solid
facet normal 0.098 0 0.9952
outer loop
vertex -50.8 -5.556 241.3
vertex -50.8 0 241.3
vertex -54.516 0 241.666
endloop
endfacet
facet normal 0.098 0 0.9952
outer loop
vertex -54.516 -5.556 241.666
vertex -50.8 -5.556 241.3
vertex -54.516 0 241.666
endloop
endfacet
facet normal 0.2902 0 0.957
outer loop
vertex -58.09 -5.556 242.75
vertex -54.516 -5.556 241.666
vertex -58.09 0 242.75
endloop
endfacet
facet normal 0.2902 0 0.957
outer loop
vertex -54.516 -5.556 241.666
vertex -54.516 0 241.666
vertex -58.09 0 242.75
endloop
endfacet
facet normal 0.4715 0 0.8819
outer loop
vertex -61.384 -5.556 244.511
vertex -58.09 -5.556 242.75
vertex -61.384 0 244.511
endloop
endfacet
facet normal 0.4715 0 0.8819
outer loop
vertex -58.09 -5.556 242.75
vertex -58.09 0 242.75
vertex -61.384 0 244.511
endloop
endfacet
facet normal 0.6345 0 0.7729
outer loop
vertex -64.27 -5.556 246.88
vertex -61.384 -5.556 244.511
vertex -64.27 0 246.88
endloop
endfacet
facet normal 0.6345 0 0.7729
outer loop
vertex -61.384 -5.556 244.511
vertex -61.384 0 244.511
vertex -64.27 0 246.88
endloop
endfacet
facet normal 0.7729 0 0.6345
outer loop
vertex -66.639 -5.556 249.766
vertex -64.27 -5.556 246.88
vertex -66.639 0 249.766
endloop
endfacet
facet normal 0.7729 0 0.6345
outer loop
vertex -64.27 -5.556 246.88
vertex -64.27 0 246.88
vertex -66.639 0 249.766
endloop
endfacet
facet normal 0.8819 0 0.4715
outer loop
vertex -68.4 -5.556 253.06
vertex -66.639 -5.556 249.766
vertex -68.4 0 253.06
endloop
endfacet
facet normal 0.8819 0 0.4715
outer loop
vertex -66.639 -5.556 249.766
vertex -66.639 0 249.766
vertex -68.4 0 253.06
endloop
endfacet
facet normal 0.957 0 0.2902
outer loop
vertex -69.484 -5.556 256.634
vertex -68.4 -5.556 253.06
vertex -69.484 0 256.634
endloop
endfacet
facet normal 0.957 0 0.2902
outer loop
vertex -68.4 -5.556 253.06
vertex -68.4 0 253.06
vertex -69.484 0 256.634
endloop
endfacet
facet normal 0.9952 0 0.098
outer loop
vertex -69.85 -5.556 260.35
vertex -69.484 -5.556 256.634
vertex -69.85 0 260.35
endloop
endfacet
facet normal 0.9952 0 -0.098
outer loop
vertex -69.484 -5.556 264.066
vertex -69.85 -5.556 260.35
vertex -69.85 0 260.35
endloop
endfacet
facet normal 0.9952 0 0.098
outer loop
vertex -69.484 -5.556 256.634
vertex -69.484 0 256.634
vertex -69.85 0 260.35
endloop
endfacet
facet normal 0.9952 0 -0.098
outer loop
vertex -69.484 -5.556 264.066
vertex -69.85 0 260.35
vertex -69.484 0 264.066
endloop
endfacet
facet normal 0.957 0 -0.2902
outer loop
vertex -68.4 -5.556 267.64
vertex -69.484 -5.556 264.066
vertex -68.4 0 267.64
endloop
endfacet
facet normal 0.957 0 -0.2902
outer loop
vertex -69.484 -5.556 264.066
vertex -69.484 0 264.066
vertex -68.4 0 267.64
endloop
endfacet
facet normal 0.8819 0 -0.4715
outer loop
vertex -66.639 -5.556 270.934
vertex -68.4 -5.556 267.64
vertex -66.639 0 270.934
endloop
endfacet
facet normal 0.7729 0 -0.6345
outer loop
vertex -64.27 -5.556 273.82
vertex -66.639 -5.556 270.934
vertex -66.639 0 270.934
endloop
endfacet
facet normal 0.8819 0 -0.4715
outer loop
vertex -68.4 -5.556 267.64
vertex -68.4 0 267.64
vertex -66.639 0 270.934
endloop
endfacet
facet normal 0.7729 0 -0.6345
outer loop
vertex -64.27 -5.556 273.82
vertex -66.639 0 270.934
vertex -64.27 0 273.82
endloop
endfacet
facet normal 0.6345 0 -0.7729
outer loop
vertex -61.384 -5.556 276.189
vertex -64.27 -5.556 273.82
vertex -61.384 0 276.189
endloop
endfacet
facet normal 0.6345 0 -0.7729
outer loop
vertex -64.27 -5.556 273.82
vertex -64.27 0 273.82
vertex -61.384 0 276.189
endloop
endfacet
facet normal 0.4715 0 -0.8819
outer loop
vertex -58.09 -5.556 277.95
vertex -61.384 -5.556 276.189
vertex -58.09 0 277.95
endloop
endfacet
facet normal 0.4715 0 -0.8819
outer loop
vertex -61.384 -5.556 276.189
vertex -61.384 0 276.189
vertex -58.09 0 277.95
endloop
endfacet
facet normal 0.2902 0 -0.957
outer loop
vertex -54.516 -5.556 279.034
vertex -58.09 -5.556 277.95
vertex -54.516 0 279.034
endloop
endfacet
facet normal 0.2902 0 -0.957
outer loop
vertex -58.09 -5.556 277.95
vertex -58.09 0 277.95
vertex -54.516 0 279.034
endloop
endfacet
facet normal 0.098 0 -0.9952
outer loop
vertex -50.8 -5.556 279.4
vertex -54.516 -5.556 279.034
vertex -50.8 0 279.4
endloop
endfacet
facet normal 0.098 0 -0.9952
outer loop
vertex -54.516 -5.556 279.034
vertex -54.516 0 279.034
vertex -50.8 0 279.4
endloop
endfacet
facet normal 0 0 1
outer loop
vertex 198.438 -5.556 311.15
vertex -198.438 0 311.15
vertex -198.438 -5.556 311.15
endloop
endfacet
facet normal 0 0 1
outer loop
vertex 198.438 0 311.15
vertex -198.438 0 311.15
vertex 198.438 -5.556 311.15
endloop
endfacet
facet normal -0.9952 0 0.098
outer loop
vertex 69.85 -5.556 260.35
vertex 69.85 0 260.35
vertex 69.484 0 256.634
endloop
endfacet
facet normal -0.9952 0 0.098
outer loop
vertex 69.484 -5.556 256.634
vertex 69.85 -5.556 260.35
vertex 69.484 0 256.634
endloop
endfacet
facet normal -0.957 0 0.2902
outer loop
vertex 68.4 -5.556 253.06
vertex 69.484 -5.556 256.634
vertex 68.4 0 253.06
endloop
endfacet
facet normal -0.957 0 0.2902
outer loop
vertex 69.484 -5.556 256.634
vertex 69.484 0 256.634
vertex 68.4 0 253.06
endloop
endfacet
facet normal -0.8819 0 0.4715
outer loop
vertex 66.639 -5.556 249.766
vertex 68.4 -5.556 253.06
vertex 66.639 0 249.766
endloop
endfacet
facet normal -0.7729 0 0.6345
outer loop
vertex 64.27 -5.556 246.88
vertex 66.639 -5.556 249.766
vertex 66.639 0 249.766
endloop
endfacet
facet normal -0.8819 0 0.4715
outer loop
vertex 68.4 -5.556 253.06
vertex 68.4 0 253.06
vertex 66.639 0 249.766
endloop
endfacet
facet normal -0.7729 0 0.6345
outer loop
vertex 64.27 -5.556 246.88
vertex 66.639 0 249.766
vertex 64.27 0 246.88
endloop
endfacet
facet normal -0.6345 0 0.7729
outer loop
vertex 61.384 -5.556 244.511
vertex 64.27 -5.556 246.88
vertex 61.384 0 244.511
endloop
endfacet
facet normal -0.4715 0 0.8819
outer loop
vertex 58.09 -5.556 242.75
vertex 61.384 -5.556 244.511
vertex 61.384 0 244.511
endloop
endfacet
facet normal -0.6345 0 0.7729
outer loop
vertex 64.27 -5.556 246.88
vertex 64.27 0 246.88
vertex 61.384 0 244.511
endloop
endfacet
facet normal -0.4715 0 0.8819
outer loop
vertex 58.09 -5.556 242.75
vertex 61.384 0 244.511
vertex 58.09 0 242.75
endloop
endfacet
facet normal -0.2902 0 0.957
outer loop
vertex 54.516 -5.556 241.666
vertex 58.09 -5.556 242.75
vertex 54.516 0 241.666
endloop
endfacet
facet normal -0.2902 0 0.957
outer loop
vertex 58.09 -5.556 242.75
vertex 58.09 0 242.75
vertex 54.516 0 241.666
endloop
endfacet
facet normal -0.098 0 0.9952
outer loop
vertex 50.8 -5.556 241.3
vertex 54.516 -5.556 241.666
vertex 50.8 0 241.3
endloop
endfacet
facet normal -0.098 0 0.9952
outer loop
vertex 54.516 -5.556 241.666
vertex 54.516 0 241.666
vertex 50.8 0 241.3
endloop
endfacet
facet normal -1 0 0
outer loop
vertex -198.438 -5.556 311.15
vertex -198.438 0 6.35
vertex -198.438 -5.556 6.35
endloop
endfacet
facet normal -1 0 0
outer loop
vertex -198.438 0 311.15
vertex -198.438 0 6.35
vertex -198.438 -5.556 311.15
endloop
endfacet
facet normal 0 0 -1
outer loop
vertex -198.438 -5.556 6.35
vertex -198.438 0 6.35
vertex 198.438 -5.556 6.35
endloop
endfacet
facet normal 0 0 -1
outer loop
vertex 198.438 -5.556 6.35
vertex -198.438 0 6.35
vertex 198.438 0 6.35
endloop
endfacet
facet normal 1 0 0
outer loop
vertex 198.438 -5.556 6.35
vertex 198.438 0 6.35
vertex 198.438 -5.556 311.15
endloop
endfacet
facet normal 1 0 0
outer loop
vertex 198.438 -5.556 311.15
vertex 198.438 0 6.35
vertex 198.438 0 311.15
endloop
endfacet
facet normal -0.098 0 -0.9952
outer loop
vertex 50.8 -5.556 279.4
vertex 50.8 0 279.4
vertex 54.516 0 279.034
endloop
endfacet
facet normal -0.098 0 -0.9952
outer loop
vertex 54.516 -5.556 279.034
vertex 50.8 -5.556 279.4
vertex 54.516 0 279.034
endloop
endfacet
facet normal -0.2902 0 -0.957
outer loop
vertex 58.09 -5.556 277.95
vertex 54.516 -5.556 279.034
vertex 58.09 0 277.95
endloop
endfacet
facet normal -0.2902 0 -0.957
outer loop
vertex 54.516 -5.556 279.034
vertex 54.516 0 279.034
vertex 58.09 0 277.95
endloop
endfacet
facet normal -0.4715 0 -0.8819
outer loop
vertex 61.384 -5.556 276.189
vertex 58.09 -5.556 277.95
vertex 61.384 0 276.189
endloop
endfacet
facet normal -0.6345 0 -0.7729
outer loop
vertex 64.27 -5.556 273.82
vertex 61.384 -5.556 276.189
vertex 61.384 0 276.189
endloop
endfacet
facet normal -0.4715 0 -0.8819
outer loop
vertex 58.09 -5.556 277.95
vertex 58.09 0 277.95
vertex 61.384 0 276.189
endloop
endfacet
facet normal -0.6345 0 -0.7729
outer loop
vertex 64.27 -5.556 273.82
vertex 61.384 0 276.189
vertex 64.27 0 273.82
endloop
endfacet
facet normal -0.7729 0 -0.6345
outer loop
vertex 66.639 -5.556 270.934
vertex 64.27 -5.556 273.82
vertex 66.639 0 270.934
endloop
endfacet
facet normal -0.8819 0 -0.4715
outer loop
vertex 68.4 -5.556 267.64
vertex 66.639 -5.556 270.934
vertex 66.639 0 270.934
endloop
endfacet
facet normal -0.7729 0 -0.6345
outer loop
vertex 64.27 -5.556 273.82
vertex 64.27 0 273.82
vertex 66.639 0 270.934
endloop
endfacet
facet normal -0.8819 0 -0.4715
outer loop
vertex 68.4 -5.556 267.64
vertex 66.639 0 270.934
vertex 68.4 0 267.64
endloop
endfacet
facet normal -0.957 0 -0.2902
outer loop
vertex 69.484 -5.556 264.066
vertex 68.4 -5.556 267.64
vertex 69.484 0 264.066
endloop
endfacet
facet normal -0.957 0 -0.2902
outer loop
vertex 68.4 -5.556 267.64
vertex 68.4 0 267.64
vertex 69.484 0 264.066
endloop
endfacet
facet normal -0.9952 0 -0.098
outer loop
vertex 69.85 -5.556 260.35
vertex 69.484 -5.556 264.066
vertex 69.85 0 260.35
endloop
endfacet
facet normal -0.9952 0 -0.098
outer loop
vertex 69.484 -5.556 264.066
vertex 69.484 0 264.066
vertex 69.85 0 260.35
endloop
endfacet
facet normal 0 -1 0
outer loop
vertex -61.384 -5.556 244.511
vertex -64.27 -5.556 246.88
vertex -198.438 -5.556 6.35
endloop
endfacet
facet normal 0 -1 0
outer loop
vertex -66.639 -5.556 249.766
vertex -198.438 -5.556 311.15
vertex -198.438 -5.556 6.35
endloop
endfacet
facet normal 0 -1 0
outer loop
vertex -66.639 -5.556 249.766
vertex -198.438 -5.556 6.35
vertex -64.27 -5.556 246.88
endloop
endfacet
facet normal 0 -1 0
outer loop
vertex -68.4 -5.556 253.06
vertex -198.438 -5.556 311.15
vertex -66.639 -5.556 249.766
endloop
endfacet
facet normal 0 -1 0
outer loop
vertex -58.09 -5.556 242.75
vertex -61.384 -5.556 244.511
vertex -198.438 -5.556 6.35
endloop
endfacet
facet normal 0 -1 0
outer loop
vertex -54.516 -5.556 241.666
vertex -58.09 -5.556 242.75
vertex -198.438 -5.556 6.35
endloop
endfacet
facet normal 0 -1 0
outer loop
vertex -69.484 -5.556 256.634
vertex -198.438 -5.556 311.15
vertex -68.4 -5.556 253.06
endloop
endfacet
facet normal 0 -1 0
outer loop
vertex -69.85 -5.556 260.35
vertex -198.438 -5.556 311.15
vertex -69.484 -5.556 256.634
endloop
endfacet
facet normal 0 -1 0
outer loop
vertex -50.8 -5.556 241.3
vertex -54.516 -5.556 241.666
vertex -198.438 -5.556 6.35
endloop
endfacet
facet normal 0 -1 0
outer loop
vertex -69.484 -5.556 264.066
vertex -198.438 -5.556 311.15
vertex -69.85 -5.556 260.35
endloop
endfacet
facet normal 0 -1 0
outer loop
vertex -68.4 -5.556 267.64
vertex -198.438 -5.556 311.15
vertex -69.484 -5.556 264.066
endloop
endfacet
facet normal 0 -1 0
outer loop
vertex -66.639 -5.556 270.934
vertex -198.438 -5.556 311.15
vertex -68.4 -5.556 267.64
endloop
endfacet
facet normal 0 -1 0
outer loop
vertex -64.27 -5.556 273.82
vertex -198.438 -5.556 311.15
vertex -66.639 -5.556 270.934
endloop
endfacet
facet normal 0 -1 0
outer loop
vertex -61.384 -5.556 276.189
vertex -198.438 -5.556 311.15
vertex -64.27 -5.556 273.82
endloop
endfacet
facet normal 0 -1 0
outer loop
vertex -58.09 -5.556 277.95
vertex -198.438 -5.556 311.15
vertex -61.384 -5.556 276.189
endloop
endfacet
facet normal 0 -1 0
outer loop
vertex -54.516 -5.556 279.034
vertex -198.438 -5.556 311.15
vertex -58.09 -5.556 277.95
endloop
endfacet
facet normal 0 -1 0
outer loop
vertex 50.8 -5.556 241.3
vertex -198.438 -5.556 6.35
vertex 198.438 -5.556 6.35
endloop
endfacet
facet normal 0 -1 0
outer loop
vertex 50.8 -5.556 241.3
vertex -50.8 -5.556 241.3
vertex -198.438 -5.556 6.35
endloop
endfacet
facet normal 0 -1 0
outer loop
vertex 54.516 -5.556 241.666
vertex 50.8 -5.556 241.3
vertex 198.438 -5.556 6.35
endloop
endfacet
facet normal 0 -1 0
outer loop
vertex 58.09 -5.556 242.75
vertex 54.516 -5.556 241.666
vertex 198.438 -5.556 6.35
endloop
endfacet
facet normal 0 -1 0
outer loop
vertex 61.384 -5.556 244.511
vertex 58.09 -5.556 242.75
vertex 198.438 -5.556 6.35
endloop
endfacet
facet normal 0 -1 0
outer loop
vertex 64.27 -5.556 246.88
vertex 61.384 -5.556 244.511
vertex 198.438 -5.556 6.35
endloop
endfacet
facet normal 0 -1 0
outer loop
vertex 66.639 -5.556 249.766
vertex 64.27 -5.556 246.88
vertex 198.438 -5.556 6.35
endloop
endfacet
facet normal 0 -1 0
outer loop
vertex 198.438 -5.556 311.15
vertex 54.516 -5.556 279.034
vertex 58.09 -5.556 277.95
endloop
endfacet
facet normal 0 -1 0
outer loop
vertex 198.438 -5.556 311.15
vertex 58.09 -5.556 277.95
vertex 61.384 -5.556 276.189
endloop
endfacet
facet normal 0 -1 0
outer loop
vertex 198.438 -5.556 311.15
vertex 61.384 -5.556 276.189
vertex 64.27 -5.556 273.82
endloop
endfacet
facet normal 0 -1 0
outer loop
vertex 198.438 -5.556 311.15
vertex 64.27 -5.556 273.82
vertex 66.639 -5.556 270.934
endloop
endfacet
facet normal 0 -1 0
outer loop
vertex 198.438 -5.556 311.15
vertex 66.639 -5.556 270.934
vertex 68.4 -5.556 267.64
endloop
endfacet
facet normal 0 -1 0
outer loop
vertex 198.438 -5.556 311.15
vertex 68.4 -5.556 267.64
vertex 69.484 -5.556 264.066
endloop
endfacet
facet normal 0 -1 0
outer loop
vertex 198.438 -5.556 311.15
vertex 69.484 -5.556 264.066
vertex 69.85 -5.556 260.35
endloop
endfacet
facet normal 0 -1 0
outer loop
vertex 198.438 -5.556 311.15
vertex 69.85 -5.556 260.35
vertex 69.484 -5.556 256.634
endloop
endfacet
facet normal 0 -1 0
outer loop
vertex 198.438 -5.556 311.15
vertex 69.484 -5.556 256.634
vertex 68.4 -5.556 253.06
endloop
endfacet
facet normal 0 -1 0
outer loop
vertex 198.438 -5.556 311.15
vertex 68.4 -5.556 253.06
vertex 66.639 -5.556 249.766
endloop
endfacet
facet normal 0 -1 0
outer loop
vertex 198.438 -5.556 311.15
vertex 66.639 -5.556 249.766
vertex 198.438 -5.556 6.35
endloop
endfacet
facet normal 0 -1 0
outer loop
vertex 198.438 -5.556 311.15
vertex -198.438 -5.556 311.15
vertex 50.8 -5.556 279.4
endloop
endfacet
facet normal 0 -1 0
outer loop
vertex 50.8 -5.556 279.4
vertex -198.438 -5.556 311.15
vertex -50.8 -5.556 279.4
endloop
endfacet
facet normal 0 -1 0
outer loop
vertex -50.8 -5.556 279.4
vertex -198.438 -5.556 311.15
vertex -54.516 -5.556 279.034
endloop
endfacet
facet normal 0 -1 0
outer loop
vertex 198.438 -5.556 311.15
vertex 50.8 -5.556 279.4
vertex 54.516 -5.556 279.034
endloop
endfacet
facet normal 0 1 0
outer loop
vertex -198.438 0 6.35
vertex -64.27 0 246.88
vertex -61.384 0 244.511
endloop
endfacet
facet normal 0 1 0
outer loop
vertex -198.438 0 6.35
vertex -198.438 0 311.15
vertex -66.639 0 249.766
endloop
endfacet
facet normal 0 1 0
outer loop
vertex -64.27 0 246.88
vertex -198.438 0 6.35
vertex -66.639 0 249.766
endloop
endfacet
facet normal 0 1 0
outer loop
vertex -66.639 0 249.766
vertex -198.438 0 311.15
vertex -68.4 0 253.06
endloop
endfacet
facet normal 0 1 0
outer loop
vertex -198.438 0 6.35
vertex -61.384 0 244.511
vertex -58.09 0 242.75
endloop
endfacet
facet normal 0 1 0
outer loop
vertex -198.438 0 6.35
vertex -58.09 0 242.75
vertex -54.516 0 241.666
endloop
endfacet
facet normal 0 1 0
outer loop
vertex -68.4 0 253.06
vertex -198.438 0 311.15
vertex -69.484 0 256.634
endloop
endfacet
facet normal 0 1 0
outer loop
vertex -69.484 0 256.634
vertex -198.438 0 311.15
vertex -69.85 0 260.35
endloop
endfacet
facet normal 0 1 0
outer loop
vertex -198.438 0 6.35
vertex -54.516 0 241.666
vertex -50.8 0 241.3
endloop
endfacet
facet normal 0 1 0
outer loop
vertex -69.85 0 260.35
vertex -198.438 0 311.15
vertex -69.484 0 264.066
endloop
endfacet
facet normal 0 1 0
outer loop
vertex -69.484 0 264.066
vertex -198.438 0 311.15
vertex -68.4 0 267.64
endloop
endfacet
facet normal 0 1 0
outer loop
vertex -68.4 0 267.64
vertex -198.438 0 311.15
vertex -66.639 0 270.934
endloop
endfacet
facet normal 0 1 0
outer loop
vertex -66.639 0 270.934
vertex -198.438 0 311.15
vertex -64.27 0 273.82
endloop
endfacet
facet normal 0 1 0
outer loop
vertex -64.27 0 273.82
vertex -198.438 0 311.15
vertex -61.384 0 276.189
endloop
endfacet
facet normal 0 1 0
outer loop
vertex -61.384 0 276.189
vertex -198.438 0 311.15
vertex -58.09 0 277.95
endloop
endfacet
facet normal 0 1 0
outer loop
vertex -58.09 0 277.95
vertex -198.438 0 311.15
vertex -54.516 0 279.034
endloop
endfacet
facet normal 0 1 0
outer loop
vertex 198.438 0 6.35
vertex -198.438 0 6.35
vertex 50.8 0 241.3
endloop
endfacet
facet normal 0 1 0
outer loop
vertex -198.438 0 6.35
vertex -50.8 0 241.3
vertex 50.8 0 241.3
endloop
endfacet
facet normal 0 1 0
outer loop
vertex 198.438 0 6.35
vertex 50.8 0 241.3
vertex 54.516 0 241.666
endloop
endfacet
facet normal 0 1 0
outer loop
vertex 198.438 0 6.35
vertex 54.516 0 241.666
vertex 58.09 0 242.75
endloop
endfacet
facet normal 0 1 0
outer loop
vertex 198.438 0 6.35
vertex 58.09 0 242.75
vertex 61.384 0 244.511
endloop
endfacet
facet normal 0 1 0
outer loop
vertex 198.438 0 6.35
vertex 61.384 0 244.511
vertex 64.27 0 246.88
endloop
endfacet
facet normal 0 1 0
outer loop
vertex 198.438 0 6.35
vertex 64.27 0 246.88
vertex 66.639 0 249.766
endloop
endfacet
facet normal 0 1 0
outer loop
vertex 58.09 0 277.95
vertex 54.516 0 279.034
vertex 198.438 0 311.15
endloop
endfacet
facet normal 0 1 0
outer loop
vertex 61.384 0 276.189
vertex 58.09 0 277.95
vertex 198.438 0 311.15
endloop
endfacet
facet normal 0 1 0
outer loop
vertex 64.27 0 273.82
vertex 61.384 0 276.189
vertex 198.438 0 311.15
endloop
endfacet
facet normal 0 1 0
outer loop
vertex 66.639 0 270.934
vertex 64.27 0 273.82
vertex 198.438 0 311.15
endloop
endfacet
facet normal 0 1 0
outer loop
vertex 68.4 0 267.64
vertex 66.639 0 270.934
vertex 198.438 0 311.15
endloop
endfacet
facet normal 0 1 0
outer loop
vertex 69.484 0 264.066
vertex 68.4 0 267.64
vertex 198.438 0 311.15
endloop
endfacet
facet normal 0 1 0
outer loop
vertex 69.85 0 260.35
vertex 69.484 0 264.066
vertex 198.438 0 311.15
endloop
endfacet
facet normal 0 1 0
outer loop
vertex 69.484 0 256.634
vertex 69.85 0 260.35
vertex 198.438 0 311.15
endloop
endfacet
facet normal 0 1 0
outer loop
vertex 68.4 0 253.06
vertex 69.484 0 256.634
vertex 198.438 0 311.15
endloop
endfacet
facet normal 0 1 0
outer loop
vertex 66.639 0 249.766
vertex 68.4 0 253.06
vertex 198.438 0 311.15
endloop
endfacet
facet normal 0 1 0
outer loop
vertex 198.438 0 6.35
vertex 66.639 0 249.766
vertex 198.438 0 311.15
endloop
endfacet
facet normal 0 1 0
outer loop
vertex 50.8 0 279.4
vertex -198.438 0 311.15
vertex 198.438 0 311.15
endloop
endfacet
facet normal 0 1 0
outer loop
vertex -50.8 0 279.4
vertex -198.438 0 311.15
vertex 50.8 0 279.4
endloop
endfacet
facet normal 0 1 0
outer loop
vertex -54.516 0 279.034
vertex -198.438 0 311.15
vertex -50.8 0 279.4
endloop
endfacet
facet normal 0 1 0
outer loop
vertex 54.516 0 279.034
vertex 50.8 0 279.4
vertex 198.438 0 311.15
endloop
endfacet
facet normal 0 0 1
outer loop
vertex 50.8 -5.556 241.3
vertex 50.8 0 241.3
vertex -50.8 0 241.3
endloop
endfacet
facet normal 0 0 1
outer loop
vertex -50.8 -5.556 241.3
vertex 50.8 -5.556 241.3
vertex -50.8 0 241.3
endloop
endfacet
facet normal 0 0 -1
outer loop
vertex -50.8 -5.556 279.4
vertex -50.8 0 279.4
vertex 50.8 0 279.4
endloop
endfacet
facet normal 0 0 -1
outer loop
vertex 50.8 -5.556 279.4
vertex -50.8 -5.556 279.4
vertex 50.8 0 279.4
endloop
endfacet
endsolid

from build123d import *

# Parameters (mm, degrees)
F0_W     = 396.875
F0_H     = 304.8
F1_DEPTH = 5.55625


with BuildPart() as f1:
    # F0 (on Front) → F1 (new body)
    with BuildSketch(Plane.XZ):
        with Locations((0, 158.75)):
            Rectangle(F0_W, F0_H)
        with BuildLine():
            ThreePointArc((-50.8, 241.3), (-69.85, 260.35), (-50.8, 279.4))
            Line((-50.8, 279.4), (50.8, 279.4))
            ThreePointArc((50.8, 279.4), (64.270384, 273.820384), (69.85, 260.35))
            ThreePointArc((69.85, 260.35), (64.270384, 246.879616), (50.8, 241.3))
            Line((50.8, 241.3), (-50.8, 241.3))
        make_face(mode=Mode.SUBTRACT)
    extrude(amount=F1_DEPTH)


solid = f1.part
